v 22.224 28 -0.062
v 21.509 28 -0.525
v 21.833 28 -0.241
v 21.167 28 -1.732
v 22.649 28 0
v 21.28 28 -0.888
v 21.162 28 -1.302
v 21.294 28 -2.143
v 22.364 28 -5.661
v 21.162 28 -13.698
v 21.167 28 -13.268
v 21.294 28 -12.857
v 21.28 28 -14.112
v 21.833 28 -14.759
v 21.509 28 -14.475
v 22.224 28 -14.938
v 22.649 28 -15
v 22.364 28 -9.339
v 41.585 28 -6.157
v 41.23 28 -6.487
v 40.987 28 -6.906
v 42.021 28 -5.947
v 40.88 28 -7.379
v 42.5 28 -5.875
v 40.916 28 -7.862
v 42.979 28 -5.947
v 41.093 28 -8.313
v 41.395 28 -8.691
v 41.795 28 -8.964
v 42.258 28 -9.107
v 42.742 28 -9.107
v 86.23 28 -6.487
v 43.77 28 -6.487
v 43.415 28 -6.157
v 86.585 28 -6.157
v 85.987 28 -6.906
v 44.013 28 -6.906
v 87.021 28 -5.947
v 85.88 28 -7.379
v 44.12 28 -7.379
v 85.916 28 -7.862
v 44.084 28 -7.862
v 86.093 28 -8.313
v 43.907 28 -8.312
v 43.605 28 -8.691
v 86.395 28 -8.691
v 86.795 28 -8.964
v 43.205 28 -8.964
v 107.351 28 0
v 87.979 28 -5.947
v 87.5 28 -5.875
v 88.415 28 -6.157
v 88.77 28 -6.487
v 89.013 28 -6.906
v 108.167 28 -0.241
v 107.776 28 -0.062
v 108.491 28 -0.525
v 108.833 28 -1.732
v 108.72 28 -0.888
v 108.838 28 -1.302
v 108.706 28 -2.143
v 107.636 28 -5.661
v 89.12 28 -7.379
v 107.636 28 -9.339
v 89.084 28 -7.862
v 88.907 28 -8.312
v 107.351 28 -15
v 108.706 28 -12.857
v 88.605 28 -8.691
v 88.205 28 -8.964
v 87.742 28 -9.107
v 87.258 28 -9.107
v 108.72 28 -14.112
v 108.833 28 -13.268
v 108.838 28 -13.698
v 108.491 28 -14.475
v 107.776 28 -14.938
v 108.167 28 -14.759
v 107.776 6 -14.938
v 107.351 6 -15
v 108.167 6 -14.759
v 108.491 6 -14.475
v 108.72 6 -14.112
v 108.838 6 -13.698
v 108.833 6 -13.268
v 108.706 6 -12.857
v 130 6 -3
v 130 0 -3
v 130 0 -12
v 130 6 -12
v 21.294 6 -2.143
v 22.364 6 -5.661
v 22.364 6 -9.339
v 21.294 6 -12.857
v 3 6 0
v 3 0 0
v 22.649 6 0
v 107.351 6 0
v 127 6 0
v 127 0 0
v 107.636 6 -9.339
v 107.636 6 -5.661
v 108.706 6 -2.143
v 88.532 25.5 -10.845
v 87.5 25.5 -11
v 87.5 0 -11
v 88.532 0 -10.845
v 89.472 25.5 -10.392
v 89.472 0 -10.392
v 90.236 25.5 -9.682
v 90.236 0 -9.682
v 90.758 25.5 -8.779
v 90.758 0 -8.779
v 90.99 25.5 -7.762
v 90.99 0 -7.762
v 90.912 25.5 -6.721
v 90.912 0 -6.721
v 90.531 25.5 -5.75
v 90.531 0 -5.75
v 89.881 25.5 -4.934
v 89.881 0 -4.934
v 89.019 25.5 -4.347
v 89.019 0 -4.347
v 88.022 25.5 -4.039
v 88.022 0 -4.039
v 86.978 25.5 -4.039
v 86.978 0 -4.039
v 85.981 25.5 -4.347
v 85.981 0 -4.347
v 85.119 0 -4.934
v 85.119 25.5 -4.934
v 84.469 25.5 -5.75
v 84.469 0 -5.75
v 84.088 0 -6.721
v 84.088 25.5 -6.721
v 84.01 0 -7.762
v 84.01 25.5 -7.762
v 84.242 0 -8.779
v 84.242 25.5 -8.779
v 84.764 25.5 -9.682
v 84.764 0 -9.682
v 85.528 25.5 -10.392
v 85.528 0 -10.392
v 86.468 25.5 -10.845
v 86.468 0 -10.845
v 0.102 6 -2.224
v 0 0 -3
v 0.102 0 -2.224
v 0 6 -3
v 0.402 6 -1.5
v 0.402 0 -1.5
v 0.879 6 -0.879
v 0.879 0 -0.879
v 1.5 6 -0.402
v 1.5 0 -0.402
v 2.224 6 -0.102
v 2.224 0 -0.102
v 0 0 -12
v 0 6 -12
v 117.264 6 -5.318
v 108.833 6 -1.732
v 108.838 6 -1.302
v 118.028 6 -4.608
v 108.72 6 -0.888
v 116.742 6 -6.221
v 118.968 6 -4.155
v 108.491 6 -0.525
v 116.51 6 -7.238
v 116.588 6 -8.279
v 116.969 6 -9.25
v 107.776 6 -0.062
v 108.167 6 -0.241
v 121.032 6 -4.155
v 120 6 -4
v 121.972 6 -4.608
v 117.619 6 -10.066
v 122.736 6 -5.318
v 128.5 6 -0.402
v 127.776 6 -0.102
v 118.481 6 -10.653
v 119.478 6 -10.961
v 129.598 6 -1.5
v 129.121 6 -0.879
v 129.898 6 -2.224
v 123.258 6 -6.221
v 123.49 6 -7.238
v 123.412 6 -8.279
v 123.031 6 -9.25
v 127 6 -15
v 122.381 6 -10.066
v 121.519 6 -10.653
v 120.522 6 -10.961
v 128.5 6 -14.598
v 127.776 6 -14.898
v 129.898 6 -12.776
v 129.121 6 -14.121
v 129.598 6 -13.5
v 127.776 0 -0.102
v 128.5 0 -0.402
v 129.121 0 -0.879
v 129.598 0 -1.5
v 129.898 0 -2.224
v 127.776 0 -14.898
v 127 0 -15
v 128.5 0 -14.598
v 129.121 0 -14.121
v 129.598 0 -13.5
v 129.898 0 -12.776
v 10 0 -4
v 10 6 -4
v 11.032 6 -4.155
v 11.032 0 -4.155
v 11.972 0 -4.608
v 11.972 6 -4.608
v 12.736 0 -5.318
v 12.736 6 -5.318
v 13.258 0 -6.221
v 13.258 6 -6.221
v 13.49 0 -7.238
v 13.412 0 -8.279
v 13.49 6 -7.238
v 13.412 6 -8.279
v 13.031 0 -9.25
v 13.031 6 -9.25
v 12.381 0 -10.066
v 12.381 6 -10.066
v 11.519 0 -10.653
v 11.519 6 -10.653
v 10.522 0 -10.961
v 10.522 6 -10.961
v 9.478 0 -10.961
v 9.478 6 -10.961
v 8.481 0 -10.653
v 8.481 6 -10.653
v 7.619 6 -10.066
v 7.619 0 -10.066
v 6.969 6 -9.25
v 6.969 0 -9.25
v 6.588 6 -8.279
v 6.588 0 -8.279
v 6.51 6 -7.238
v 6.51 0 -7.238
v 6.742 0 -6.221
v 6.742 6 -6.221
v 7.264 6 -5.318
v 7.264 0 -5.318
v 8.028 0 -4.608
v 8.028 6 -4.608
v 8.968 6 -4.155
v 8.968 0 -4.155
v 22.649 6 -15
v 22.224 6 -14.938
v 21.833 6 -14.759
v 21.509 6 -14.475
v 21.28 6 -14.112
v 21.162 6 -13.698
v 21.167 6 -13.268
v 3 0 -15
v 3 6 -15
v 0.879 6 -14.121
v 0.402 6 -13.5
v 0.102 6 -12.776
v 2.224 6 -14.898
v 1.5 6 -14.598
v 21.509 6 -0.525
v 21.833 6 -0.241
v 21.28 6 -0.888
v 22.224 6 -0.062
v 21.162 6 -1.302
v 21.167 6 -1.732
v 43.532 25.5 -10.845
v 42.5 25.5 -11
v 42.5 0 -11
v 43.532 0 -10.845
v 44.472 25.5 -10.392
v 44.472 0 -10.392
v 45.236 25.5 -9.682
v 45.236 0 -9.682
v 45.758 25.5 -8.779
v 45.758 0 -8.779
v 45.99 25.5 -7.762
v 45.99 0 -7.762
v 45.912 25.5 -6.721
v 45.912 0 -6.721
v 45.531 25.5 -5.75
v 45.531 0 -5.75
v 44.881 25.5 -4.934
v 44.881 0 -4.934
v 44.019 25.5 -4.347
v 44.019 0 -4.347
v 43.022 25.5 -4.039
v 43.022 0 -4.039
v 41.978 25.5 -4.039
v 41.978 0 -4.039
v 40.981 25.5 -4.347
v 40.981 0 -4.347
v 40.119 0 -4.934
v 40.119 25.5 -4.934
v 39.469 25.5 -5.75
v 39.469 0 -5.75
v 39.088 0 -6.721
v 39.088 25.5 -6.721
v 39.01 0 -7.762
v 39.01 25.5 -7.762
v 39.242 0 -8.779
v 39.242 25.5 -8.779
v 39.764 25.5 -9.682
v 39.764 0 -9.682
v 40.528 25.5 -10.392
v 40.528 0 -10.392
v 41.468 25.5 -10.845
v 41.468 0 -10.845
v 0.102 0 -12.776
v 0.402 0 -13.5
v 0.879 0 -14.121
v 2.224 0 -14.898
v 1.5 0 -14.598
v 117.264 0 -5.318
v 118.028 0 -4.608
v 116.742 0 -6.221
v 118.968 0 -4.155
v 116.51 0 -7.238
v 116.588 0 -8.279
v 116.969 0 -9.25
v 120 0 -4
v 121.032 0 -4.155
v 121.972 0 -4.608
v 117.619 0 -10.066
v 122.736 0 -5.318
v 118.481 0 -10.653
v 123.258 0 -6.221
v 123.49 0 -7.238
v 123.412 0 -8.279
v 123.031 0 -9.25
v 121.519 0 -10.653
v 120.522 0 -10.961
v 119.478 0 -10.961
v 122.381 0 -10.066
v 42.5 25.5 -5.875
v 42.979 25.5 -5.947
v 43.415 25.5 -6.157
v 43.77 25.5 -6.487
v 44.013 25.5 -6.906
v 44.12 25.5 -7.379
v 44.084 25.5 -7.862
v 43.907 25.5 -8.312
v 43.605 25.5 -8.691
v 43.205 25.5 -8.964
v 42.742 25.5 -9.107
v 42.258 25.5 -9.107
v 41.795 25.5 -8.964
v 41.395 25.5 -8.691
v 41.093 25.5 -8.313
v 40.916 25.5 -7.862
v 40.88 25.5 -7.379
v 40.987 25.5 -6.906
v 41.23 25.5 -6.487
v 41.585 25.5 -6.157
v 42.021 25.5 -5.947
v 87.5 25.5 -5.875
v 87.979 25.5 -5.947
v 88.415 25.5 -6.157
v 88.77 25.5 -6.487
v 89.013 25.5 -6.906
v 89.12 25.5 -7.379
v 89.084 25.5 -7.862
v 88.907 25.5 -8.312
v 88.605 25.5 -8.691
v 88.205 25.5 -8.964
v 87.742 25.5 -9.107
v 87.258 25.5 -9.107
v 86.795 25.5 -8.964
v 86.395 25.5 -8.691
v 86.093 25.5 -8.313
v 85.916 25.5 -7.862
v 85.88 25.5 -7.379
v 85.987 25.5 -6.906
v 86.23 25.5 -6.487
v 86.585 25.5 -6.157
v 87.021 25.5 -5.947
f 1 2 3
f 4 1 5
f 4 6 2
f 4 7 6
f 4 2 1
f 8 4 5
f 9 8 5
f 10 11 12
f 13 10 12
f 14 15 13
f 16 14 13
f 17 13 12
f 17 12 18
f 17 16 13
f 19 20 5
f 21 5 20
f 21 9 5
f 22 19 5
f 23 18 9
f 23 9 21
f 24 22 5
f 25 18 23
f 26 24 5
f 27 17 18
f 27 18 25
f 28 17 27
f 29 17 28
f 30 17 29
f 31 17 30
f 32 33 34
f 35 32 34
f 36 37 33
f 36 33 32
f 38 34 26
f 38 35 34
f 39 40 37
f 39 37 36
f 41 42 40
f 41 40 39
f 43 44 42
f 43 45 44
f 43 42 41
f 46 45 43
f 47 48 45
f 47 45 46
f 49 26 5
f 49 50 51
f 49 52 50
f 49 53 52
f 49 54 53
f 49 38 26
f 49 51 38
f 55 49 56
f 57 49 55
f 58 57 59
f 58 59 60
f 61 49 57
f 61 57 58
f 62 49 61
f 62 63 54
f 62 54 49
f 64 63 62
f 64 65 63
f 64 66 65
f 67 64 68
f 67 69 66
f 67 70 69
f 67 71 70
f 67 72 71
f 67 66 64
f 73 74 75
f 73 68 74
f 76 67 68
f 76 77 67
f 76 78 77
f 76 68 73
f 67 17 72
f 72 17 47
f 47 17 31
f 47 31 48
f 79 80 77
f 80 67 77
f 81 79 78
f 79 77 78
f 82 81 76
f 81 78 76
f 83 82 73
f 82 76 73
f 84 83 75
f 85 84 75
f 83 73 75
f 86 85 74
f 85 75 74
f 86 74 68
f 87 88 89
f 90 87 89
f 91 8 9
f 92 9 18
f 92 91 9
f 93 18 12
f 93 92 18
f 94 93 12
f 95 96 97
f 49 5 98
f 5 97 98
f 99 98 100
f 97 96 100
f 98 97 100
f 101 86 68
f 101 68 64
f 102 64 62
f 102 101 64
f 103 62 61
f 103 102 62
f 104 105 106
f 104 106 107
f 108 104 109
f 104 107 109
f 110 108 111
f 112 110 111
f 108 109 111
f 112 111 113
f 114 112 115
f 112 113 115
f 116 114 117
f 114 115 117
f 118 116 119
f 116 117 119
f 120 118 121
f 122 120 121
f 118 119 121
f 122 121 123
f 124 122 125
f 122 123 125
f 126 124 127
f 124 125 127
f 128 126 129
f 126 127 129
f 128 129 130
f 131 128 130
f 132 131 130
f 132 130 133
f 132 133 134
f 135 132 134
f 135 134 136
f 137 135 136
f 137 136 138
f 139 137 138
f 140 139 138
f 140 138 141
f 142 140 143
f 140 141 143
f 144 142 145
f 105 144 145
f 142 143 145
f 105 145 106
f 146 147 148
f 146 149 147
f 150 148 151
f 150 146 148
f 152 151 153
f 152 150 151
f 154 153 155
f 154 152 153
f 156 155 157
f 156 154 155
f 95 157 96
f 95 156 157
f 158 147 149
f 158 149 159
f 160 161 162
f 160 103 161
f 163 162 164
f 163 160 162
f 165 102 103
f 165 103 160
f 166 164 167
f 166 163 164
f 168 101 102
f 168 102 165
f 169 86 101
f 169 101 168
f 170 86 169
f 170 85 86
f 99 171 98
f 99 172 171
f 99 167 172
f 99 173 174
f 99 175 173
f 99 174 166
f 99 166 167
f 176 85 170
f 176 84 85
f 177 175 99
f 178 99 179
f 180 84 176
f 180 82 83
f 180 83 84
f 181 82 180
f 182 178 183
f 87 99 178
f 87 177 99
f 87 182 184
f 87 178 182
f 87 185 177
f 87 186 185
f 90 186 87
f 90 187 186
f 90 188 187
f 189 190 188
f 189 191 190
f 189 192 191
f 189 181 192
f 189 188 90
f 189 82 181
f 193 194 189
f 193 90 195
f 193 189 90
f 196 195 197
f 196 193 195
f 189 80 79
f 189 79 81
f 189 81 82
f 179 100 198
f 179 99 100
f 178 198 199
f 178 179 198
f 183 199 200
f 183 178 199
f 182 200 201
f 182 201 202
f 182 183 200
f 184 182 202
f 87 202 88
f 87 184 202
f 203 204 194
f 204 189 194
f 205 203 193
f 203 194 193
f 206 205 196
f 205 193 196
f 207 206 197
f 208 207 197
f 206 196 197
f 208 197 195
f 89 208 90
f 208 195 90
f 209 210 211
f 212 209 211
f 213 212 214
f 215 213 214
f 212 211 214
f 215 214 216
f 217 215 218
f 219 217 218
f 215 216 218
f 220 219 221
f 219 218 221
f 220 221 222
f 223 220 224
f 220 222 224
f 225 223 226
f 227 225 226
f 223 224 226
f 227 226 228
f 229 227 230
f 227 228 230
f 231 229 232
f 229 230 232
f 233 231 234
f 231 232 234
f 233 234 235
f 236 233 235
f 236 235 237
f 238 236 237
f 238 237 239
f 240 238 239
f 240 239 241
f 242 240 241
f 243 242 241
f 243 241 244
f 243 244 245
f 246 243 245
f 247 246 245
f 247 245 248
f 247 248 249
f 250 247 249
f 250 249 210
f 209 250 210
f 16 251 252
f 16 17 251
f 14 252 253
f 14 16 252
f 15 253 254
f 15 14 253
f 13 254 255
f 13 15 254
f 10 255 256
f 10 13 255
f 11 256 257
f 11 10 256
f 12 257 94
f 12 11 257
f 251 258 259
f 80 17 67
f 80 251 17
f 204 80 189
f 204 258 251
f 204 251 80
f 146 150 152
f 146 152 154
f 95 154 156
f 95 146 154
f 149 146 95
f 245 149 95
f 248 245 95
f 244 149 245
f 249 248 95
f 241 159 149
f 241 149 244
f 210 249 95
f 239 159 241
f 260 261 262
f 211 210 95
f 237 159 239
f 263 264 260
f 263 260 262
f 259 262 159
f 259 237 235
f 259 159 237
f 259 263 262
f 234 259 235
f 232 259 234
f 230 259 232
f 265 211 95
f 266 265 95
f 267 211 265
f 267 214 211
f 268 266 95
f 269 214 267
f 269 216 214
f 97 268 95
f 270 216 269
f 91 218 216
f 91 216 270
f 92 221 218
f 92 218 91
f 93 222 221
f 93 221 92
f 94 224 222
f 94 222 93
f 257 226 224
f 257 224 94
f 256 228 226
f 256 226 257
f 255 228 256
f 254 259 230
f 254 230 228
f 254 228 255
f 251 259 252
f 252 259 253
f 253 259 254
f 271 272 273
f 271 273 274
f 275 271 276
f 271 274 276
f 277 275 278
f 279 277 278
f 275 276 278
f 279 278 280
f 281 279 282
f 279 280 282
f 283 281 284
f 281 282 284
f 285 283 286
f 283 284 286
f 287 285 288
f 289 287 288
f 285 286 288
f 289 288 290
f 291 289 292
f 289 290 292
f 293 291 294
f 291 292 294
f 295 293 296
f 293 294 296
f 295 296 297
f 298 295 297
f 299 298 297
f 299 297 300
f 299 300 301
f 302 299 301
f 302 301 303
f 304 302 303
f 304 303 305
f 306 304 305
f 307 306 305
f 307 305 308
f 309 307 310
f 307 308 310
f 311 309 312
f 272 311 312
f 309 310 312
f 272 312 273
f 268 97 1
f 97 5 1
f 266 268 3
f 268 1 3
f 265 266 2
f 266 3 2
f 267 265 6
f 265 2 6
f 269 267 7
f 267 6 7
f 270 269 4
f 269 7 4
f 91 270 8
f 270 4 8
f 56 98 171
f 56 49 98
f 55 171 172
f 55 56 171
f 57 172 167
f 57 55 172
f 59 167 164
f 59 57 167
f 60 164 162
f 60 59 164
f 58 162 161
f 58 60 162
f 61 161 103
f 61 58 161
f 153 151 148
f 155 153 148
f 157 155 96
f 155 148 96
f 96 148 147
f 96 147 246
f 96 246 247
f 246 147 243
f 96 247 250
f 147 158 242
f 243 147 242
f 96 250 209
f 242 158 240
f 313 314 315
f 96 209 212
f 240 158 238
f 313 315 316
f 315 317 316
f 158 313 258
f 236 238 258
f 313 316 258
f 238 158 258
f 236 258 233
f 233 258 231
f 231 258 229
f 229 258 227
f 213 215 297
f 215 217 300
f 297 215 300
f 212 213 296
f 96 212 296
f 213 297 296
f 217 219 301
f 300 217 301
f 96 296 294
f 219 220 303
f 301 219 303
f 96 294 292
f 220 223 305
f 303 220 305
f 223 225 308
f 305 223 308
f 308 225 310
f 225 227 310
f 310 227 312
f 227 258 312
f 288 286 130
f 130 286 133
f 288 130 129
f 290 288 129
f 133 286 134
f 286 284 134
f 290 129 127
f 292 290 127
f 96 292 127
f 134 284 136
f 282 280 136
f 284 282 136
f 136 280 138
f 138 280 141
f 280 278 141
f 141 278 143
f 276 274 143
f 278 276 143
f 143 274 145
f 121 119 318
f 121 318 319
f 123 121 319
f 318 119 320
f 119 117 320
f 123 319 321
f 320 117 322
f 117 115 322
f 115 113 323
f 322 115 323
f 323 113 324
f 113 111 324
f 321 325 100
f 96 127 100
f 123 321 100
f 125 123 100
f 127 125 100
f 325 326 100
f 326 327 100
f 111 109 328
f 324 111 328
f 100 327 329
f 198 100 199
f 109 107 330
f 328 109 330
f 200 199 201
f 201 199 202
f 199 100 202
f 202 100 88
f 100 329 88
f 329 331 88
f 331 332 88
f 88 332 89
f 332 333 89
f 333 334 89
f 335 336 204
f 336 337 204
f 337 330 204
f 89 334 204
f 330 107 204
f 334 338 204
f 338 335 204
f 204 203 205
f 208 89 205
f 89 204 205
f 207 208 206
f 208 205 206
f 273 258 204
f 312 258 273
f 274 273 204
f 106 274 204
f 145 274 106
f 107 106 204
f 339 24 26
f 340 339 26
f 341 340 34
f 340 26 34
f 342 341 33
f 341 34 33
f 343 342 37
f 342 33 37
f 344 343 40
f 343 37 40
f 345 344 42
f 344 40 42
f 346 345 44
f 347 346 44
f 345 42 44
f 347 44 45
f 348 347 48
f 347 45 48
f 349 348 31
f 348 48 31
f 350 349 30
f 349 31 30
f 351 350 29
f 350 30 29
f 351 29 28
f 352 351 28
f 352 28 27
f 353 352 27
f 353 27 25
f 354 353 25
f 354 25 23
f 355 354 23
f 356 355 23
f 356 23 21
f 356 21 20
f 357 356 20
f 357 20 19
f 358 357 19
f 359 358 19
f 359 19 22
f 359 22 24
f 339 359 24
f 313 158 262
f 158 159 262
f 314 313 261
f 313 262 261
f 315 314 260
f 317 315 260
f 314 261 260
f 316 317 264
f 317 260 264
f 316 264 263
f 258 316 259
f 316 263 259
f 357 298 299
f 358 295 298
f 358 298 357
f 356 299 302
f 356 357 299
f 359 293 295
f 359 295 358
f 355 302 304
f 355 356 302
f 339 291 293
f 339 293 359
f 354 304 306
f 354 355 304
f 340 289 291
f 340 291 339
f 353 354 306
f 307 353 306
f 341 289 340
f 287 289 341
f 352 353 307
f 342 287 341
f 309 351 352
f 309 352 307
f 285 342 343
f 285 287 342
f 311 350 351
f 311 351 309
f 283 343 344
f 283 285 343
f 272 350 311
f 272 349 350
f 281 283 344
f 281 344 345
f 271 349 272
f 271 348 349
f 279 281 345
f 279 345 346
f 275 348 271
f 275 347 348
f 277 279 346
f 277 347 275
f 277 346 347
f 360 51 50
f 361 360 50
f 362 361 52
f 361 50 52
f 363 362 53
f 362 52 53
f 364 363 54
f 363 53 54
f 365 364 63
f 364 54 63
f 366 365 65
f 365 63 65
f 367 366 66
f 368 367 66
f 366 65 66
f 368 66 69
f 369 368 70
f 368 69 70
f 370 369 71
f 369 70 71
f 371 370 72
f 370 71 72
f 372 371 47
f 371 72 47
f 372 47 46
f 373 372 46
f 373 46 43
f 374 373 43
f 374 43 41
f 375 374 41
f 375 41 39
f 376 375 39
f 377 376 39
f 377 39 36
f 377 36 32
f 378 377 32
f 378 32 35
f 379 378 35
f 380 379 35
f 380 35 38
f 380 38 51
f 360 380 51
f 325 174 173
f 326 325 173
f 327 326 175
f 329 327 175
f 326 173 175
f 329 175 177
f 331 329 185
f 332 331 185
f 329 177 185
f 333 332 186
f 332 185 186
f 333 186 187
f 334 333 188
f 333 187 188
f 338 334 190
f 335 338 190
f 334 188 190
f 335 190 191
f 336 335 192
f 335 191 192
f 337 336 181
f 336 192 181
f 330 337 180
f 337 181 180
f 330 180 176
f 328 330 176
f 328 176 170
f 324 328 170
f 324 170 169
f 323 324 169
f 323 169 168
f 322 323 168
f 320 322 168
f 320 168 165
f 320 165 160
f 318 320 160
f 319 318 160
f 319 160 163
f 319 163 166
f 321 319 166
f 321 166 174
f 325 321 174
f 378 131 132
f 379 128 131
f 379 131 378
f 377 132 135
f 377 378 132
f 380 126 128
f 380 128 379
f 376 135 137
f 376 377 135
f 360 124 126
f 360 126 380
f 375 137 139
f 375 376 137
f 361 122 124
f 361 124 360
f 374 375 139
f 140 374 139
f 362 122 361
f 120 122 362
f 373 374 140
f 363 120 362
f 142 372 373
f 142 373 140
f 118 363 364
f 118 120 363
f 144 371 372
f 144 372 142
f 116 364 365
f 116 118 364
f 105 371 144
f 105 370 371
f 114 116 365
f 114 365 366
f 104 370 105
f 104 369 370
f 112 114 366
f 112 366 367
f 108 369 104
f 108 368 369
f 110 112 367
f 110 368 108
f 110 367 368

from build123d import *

# Parameters (mm, degrees)
SKETCH1_W           = 130
SKETCH1_H           = 15
BOSS_EXTRUDE1_DEPTH = 6
SKETCH2_W           = 90
SKETCH2_H           = 15
BOSS_EXTRUDE2_DEPTH = 22
CUT_EXTRUDE1_REACH  = 134.699
SKETCH3_R           = 3.5
CUT_EXTRUDE2_REACH  = 134.699
SKETCH4_R           = 12.5
CUT_EXTRUDE3_REACH  = 135.825
SKETCH5_R           = 1.625
SKETCH6_R           = 3.5
CUT_EXTRUDE4_DEPTH  = 25.5
FILLET1_R           = 3
FILLET3_R           = 1.5


with BuildPart() as part:
    # Sketch1 → Boss-Extrude1 (new body)
    with BuildSketch(Plane(origin=(0, 0, 0), x_dir=(1, 0, 0), z_dir=(0, 1, 0))):
        with Locations((65, 7.5)):
            Rectangle(SKETCH1_W, SKETCH1_H)
    extrude(amount=BOSS_EXTRUDE1_DEPTH)

    # Sketch2 → Boss-Extrude2 (add)
    with BuildSketch(Plane(origin=(0, 6, 0), x_dir=(1, 0, 0), z_dir=(0, 1, 0))):
        with Locations((65, 7.5)):
            Rectangle(SKETCH2_W, SKETCH2_H)
    extrude(amount=BOSS_EXTRUDE2_DEPTH)

    # Sketch3 → Cut-Extrude1 (cut, up to next)
    with BuildSketch(Plane(origin=(0, 6, 0), x_dir=(1, 0, 0), z_dir=(0, 1, 0)), mode=Mode.PRIVATE) as cut_extrude1_sk1:
        with Locations(Location((10, 7.5, 0), (0, 0, 270))):
            Circle(SKETCH3_R)
    cut_extrude1_tool1 = extrude(cut_extrude1_sk1.sketch, amount=-CUT_EXTRUDE1_REACH, mode=Mode.PRIVATE) & part.part
    # Sketch3 → Cut-Extrude1 (cut, up to next)
    with BuildSketch(Plane(origin=(0, 6, 0), x_dir=(1, 0, 0), z_dir=(0, 1, 0)), mode=Mode.PRIVATE) as cut_extrude1_sk2:
        with Locations(Location((120, 7.5, 0), (0, 0, 270))):
            Circle(SKETCH3_R)
    cut_extrude1_tool2 = extrude(cut_extrude1_sk2.sketch, amount=-CUT_EXTRUDE1_REACH, mode=Mode.PRIVATE) & part.part
    add(cut_extrude1_tool1.solids().sort_by_distance((10, 6, -7.5))[0], mode=Mode.SUBTRACT)
    add(cut_extrude1_tool2.solids().sort_by_distance((120, 6, -7.5))[0], mode=Mode.SUBTRACT)

    # Sketch4 → Cut-Extrude2 (cut, up to next)
    with BuildSketch(Plane(origin=(0, 6, 0), x_dir=(1, 0, 0), z_dir=(0, 1, 0)), mode=Mode.PRIVATE) as cut_extrude2_sk1:
        with Locations((10, 7.5)):
            Circle(SKETCH4_R)
    cut_extrude2_tool1 = extrude(cut_extrude2_sk1.sketch, amount=CUT_EXTRUDE2_REACH, mode=Mode.PRIVATE) & part.part
    # Sketch4 → Cut-Extrude2 (cut, up to next)
    with BuildSketch(Plane(origin=(0, 6, 0), x_dir=(1, 0, 0), z_dir=(0, 1, 0)), mode=Mode.PRIVATE) as cut_extrude2_sk2:
        with Locations((120, 7.5)):
            Circle(SKETCH4_R)
    cut_extrude2_tool2 = extrude(cut_extrude2_sk2.sketch, amount=CUT_EXTRUDE2_REACH, mode=Mode.PRIVATE) & part.part
    add(cut_extrude2_tool1.solids().sort_by_distance((10, 6, -7.5))[0], mode=Mode.SUBTRACT)
    add(cut_extrude2_tool2.solids().sort_by_distance((120, 6, -7.5))[0], mode=Mode.SUBTRACT)

    # Sketch5 → Cut-Extrude3 (cut, up to next)
    with BuildSketch(Plane(origin=(0, 28, 0), x_dir=(1, 0, 0), z_dir=(0, 1, 0)), mode=Mode.PRIVATE) as cut_extrude3_sk1:
        with Locations(Location((42.5, 7.5, 0), (0, 0, 270))):
            Circle(SKETCH5_R)
    cut_extrude3_tool1 = extrude(cut_extrude3_sk1.sketch, amount=-CUT_EXTRUDE3_REACH, mode=Mode.PRIVATE) & part.part
    # Sketch5 → Cut-Extrude3 (cut, up to next)
    with BuildSketch(Plane(origin=(0, 28, 0), x_dir=(1, 0, 0), z_dir=(0, 1, 0)), mode=Mode.PRIVATE) as cut_extrude3_sk2:
        with Locations(Location((87.5, 7.5, 0), (0, 0, 270))):
            Circle(SKETCH5_R)
    cut_extrude3_tool2 = extrude(cut_extrude3_sk2.sketch, amount=-CUT_EXTRUDE3_REACH, mode=Mode.PRIVATE) & part.part
    add(cut_extrude3_tool1.solids().sort_by_distance((42.5, 28, -7.5))[0], mode=Mode.SUBTRACT)
    add(cut_extrude3_tool2.solids().sort_by_distance((87.5, 28, -7.5))[0], mode=Mode.SUBTRACT)

    # Sketch6 → Cut-Extrude4 (cut)
    with BuildSketch(Plane.XZ):
        with Locations(Location((42.5, -7.5, 0), (0, 0, 270))):
            Circle(SKETCH6_R)
        with Locations(Location((87.5, -7.5, 0), (0, 0, 270))):
            Circle(SKETCH6_R)
    extrude(amount=-CUT_EXTRUDE4_DEPTH, mode=Mode.SUBTRACT)

    # Fillet1
    fillet1_edges = [part.edges().sort_by_distance(p)[0] for p in [
        (0, 3, -15),
        (130, 3, -15),
        (130, 3, 0),
        (0, 3, 0),
    ]]
    fillet(fillet1_edges, radius=FILLET1_R)

    # Fillet3
    fillet3_edges = [part.edges().sort_by_distance(p)[0] for p in [
        (20, 17, -15),
        (20, 17, 0),
        (110, 17, 0),
        (110, 17, -15),
    ]]
    fillet(fillet3_edges, radius=FILLET3_R)


solid = part.part
